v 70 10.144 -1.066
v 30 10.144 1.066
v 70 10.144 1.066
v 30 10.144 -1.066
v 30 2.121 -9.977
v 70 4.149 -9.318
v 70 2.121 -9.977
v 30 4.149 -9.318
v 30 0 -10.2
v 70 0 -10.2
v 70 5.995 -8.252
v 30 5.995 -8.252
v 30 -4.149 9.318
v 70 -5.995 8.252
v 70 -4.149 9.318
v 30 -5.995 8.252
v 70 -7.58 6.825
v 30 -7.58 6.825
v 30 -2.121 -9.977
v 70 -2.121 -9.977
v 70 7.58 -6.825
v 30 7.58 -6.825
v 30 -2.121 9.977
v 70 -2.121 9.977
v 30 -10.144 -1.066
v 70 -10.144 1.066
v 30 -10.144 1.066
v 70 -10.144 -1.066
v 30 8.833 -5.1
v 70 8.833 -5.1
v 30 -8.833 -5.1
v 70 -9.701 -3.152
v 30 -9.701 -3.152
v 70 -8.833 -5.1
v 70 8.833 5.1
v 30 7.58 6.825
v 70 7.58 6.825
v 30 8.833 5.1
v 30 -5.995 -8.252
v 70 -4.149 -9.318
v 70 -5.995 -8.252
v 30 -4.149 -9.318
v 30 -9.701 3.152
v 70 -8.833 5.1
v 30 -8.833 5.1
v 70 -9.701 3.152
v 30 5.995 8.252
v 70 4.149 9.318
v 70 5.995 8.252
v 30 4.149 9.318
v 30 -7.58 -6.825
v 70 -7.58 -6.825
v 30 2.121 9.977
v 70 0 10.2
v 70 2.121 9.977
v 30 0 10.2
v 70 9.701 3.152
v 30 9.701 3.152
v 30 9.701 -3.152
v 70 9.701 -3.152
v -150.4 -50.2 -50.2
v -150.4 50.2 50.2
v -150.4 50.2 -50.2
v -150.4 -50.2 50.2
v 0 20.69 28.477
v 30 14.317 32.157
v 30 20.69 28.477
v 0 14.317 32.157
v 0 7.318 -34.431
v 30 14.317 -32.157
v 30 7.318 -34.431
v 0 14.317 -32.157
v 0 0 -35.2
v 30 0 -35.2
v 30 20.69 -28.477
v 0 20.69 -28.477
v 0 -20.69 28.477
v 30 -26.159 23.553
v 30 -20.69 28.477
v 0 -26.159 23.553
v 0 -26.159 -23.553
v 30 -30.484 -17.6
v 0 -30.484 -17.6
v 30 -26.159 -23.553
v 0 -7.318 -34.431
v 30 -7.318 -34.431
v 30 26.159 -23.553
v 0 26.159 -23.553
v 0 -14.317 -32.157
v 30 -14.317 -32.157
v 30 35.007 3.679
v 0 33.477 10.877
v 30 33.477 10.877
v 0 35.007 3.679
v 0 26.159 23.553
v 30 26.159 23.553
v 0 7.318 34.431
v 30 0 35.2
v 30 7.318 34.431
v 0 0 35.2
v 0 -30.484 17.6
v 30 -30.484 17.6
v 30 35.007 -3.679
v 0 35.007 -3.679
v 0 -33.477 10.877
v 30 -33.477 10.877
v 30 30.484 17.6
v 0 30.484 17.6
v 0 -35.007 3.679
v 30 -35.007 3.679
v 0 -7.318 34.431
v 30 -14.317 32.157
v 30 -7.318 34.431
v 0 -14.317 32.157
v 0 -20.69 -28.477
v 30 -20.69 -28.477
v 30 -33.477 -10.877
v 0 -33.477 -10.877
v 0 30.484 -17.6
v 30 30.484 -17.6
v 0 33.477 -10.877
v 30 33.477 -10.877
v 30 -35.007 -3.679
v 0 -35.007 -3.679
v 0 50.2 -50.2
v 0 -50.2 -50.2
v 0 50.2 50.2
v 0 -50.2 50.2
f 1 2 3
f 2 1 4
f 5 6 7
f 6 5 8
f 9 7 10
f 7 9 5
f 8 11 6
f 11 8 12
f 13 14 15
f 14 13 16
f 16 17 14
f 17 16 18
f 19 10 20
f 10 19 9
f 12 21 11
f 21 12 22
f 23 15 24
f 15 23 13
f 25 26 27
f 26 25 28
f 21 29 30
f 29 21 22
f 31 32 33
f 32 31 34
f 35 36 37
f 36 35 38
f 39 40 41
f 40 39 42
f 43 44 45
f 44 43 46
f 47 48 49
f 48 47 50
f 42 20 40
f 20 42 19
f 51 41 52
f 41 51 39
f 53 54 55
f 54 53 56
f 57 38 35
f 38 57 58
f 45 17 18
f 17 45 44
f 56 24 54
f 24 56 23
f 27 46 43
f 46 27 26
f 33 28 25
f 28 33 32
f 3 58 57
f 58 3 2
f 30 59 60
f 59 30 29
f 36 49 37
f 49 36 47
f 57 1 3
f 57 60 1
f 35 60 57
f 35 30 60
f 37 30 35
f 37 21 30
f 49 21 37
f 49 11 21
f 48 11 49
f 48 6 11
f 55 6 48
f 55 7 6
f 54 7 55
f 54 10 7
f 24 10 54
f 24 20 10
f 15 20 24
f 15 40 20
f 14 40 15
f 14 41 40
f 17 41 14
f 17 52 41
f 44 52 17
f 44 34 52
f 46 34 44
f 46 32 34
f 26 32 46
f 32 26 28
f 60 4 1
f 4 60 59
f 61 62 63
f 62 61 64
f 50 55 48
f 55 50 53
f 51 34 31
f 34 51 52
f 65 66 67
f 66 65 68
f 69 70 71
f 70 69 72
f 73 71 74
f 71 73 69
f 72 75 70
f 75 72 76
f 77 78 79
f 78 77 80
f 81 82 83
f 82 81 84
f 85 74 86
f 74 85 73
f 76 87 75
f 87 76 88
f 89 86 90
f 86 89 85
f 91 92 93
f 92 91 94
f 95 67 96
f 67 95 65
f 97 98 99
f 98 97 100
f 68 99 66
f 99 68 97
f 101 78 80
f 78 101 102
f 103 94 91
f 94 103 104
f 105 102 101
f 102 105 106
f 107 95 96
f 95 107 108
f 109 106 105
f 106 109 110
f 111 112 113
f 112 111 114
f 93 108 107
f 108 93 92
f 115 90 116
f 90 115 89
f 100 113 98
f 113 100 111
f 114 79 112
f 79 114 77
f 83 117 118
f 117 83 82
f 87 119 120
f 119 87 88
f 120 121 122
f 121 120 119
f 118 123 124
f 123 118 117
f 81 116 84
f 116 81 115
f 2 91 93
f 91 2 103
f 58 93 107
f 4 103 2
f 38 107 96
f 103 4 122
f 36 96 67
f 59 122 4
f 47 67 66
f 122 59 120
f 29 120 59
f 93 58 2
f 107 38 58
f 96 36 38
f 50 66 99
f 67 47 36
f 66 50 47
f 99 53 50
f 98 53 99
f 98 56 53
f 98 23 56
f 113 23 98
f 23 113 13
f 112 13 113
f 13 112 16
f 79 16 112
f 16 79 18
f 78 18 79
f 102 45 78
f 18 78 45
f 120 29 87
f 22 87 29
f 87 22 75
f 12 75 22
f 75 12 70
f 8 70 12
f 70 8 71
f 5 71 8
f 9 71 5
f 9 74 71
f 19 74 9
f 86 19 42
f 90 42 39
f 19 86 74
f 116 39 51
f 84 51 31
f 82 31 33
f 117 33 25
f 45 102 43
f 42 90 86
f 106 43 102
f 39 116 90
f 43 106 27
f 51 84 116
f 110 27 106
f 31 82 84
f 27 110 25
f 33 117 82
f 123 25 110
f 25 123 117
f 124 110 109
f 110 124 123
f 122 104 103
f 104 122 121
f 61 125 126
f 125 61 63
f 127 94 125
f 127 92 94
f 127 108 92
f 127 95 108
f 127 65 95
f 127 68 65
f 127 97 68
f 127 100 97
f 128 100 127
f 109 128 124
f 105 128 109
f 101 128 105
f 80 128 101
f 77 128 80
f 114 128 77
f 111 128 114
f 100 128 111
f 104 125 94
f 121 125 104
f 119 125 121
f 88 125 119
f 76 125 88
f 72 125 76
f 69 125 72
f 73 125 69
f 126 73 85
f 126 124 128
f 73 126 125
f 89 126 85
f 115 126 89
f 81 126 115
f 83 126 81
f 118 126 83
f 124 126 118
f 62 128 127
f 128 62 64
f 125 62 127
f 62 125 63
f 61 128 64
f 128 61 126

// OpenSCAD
function BoxWidth(3dPrinterTolerance=.4)=100+3dPrinterTolerance;
function BoxHeight(3dPrinterTolerance=.4)=150+3dPrinterTolerance;
function HubDiameter(3dPrinterTolerance=.4)=70+3dPrinterTolerance;
function HubHeight(3dPrinterTolerance=.4)=180+3dPrinterTolerance;
function ShaftDiameter(3dPrinterTolerance=.4)=20+3dPrinterTolerance;
function ShaftHeight(3dPrinterTolerance=.4)=220+3dPrinterTolerance;

module GenericStepper(3dPrinterTolerance=.4)
{
color("Gray")
rotate([0,90,0])
{
	translate([0,0,-BoxHeight(3dPrinterTolerance)])
		{
		union()
			{
			cylinder(ShaftHeight(3dPrinterTolerance), ShaftDiameter(3dPrinterTolerance)/2, ShaftDiameter(3dPrinterTolerance)/2);
			cylinder(HubHeight(3dPrinterTolerance), HubDiameter(3dPrinterTolerance)/2, HubDiameter(3dPrinterTolerance)/2);
			translate([-BoxWidth(3dPrinterTolerance)/2,-BoxWidth(3dPrinterTolerance)/2,0])
				{
				cube([BoxWidth(3dPrinterTolerance), BoxWidth(3dPrinterTolerance), BoxHeight(3dPrinterTolerance)]);
				}
			}
		}
	}
}

GenericStepper();
